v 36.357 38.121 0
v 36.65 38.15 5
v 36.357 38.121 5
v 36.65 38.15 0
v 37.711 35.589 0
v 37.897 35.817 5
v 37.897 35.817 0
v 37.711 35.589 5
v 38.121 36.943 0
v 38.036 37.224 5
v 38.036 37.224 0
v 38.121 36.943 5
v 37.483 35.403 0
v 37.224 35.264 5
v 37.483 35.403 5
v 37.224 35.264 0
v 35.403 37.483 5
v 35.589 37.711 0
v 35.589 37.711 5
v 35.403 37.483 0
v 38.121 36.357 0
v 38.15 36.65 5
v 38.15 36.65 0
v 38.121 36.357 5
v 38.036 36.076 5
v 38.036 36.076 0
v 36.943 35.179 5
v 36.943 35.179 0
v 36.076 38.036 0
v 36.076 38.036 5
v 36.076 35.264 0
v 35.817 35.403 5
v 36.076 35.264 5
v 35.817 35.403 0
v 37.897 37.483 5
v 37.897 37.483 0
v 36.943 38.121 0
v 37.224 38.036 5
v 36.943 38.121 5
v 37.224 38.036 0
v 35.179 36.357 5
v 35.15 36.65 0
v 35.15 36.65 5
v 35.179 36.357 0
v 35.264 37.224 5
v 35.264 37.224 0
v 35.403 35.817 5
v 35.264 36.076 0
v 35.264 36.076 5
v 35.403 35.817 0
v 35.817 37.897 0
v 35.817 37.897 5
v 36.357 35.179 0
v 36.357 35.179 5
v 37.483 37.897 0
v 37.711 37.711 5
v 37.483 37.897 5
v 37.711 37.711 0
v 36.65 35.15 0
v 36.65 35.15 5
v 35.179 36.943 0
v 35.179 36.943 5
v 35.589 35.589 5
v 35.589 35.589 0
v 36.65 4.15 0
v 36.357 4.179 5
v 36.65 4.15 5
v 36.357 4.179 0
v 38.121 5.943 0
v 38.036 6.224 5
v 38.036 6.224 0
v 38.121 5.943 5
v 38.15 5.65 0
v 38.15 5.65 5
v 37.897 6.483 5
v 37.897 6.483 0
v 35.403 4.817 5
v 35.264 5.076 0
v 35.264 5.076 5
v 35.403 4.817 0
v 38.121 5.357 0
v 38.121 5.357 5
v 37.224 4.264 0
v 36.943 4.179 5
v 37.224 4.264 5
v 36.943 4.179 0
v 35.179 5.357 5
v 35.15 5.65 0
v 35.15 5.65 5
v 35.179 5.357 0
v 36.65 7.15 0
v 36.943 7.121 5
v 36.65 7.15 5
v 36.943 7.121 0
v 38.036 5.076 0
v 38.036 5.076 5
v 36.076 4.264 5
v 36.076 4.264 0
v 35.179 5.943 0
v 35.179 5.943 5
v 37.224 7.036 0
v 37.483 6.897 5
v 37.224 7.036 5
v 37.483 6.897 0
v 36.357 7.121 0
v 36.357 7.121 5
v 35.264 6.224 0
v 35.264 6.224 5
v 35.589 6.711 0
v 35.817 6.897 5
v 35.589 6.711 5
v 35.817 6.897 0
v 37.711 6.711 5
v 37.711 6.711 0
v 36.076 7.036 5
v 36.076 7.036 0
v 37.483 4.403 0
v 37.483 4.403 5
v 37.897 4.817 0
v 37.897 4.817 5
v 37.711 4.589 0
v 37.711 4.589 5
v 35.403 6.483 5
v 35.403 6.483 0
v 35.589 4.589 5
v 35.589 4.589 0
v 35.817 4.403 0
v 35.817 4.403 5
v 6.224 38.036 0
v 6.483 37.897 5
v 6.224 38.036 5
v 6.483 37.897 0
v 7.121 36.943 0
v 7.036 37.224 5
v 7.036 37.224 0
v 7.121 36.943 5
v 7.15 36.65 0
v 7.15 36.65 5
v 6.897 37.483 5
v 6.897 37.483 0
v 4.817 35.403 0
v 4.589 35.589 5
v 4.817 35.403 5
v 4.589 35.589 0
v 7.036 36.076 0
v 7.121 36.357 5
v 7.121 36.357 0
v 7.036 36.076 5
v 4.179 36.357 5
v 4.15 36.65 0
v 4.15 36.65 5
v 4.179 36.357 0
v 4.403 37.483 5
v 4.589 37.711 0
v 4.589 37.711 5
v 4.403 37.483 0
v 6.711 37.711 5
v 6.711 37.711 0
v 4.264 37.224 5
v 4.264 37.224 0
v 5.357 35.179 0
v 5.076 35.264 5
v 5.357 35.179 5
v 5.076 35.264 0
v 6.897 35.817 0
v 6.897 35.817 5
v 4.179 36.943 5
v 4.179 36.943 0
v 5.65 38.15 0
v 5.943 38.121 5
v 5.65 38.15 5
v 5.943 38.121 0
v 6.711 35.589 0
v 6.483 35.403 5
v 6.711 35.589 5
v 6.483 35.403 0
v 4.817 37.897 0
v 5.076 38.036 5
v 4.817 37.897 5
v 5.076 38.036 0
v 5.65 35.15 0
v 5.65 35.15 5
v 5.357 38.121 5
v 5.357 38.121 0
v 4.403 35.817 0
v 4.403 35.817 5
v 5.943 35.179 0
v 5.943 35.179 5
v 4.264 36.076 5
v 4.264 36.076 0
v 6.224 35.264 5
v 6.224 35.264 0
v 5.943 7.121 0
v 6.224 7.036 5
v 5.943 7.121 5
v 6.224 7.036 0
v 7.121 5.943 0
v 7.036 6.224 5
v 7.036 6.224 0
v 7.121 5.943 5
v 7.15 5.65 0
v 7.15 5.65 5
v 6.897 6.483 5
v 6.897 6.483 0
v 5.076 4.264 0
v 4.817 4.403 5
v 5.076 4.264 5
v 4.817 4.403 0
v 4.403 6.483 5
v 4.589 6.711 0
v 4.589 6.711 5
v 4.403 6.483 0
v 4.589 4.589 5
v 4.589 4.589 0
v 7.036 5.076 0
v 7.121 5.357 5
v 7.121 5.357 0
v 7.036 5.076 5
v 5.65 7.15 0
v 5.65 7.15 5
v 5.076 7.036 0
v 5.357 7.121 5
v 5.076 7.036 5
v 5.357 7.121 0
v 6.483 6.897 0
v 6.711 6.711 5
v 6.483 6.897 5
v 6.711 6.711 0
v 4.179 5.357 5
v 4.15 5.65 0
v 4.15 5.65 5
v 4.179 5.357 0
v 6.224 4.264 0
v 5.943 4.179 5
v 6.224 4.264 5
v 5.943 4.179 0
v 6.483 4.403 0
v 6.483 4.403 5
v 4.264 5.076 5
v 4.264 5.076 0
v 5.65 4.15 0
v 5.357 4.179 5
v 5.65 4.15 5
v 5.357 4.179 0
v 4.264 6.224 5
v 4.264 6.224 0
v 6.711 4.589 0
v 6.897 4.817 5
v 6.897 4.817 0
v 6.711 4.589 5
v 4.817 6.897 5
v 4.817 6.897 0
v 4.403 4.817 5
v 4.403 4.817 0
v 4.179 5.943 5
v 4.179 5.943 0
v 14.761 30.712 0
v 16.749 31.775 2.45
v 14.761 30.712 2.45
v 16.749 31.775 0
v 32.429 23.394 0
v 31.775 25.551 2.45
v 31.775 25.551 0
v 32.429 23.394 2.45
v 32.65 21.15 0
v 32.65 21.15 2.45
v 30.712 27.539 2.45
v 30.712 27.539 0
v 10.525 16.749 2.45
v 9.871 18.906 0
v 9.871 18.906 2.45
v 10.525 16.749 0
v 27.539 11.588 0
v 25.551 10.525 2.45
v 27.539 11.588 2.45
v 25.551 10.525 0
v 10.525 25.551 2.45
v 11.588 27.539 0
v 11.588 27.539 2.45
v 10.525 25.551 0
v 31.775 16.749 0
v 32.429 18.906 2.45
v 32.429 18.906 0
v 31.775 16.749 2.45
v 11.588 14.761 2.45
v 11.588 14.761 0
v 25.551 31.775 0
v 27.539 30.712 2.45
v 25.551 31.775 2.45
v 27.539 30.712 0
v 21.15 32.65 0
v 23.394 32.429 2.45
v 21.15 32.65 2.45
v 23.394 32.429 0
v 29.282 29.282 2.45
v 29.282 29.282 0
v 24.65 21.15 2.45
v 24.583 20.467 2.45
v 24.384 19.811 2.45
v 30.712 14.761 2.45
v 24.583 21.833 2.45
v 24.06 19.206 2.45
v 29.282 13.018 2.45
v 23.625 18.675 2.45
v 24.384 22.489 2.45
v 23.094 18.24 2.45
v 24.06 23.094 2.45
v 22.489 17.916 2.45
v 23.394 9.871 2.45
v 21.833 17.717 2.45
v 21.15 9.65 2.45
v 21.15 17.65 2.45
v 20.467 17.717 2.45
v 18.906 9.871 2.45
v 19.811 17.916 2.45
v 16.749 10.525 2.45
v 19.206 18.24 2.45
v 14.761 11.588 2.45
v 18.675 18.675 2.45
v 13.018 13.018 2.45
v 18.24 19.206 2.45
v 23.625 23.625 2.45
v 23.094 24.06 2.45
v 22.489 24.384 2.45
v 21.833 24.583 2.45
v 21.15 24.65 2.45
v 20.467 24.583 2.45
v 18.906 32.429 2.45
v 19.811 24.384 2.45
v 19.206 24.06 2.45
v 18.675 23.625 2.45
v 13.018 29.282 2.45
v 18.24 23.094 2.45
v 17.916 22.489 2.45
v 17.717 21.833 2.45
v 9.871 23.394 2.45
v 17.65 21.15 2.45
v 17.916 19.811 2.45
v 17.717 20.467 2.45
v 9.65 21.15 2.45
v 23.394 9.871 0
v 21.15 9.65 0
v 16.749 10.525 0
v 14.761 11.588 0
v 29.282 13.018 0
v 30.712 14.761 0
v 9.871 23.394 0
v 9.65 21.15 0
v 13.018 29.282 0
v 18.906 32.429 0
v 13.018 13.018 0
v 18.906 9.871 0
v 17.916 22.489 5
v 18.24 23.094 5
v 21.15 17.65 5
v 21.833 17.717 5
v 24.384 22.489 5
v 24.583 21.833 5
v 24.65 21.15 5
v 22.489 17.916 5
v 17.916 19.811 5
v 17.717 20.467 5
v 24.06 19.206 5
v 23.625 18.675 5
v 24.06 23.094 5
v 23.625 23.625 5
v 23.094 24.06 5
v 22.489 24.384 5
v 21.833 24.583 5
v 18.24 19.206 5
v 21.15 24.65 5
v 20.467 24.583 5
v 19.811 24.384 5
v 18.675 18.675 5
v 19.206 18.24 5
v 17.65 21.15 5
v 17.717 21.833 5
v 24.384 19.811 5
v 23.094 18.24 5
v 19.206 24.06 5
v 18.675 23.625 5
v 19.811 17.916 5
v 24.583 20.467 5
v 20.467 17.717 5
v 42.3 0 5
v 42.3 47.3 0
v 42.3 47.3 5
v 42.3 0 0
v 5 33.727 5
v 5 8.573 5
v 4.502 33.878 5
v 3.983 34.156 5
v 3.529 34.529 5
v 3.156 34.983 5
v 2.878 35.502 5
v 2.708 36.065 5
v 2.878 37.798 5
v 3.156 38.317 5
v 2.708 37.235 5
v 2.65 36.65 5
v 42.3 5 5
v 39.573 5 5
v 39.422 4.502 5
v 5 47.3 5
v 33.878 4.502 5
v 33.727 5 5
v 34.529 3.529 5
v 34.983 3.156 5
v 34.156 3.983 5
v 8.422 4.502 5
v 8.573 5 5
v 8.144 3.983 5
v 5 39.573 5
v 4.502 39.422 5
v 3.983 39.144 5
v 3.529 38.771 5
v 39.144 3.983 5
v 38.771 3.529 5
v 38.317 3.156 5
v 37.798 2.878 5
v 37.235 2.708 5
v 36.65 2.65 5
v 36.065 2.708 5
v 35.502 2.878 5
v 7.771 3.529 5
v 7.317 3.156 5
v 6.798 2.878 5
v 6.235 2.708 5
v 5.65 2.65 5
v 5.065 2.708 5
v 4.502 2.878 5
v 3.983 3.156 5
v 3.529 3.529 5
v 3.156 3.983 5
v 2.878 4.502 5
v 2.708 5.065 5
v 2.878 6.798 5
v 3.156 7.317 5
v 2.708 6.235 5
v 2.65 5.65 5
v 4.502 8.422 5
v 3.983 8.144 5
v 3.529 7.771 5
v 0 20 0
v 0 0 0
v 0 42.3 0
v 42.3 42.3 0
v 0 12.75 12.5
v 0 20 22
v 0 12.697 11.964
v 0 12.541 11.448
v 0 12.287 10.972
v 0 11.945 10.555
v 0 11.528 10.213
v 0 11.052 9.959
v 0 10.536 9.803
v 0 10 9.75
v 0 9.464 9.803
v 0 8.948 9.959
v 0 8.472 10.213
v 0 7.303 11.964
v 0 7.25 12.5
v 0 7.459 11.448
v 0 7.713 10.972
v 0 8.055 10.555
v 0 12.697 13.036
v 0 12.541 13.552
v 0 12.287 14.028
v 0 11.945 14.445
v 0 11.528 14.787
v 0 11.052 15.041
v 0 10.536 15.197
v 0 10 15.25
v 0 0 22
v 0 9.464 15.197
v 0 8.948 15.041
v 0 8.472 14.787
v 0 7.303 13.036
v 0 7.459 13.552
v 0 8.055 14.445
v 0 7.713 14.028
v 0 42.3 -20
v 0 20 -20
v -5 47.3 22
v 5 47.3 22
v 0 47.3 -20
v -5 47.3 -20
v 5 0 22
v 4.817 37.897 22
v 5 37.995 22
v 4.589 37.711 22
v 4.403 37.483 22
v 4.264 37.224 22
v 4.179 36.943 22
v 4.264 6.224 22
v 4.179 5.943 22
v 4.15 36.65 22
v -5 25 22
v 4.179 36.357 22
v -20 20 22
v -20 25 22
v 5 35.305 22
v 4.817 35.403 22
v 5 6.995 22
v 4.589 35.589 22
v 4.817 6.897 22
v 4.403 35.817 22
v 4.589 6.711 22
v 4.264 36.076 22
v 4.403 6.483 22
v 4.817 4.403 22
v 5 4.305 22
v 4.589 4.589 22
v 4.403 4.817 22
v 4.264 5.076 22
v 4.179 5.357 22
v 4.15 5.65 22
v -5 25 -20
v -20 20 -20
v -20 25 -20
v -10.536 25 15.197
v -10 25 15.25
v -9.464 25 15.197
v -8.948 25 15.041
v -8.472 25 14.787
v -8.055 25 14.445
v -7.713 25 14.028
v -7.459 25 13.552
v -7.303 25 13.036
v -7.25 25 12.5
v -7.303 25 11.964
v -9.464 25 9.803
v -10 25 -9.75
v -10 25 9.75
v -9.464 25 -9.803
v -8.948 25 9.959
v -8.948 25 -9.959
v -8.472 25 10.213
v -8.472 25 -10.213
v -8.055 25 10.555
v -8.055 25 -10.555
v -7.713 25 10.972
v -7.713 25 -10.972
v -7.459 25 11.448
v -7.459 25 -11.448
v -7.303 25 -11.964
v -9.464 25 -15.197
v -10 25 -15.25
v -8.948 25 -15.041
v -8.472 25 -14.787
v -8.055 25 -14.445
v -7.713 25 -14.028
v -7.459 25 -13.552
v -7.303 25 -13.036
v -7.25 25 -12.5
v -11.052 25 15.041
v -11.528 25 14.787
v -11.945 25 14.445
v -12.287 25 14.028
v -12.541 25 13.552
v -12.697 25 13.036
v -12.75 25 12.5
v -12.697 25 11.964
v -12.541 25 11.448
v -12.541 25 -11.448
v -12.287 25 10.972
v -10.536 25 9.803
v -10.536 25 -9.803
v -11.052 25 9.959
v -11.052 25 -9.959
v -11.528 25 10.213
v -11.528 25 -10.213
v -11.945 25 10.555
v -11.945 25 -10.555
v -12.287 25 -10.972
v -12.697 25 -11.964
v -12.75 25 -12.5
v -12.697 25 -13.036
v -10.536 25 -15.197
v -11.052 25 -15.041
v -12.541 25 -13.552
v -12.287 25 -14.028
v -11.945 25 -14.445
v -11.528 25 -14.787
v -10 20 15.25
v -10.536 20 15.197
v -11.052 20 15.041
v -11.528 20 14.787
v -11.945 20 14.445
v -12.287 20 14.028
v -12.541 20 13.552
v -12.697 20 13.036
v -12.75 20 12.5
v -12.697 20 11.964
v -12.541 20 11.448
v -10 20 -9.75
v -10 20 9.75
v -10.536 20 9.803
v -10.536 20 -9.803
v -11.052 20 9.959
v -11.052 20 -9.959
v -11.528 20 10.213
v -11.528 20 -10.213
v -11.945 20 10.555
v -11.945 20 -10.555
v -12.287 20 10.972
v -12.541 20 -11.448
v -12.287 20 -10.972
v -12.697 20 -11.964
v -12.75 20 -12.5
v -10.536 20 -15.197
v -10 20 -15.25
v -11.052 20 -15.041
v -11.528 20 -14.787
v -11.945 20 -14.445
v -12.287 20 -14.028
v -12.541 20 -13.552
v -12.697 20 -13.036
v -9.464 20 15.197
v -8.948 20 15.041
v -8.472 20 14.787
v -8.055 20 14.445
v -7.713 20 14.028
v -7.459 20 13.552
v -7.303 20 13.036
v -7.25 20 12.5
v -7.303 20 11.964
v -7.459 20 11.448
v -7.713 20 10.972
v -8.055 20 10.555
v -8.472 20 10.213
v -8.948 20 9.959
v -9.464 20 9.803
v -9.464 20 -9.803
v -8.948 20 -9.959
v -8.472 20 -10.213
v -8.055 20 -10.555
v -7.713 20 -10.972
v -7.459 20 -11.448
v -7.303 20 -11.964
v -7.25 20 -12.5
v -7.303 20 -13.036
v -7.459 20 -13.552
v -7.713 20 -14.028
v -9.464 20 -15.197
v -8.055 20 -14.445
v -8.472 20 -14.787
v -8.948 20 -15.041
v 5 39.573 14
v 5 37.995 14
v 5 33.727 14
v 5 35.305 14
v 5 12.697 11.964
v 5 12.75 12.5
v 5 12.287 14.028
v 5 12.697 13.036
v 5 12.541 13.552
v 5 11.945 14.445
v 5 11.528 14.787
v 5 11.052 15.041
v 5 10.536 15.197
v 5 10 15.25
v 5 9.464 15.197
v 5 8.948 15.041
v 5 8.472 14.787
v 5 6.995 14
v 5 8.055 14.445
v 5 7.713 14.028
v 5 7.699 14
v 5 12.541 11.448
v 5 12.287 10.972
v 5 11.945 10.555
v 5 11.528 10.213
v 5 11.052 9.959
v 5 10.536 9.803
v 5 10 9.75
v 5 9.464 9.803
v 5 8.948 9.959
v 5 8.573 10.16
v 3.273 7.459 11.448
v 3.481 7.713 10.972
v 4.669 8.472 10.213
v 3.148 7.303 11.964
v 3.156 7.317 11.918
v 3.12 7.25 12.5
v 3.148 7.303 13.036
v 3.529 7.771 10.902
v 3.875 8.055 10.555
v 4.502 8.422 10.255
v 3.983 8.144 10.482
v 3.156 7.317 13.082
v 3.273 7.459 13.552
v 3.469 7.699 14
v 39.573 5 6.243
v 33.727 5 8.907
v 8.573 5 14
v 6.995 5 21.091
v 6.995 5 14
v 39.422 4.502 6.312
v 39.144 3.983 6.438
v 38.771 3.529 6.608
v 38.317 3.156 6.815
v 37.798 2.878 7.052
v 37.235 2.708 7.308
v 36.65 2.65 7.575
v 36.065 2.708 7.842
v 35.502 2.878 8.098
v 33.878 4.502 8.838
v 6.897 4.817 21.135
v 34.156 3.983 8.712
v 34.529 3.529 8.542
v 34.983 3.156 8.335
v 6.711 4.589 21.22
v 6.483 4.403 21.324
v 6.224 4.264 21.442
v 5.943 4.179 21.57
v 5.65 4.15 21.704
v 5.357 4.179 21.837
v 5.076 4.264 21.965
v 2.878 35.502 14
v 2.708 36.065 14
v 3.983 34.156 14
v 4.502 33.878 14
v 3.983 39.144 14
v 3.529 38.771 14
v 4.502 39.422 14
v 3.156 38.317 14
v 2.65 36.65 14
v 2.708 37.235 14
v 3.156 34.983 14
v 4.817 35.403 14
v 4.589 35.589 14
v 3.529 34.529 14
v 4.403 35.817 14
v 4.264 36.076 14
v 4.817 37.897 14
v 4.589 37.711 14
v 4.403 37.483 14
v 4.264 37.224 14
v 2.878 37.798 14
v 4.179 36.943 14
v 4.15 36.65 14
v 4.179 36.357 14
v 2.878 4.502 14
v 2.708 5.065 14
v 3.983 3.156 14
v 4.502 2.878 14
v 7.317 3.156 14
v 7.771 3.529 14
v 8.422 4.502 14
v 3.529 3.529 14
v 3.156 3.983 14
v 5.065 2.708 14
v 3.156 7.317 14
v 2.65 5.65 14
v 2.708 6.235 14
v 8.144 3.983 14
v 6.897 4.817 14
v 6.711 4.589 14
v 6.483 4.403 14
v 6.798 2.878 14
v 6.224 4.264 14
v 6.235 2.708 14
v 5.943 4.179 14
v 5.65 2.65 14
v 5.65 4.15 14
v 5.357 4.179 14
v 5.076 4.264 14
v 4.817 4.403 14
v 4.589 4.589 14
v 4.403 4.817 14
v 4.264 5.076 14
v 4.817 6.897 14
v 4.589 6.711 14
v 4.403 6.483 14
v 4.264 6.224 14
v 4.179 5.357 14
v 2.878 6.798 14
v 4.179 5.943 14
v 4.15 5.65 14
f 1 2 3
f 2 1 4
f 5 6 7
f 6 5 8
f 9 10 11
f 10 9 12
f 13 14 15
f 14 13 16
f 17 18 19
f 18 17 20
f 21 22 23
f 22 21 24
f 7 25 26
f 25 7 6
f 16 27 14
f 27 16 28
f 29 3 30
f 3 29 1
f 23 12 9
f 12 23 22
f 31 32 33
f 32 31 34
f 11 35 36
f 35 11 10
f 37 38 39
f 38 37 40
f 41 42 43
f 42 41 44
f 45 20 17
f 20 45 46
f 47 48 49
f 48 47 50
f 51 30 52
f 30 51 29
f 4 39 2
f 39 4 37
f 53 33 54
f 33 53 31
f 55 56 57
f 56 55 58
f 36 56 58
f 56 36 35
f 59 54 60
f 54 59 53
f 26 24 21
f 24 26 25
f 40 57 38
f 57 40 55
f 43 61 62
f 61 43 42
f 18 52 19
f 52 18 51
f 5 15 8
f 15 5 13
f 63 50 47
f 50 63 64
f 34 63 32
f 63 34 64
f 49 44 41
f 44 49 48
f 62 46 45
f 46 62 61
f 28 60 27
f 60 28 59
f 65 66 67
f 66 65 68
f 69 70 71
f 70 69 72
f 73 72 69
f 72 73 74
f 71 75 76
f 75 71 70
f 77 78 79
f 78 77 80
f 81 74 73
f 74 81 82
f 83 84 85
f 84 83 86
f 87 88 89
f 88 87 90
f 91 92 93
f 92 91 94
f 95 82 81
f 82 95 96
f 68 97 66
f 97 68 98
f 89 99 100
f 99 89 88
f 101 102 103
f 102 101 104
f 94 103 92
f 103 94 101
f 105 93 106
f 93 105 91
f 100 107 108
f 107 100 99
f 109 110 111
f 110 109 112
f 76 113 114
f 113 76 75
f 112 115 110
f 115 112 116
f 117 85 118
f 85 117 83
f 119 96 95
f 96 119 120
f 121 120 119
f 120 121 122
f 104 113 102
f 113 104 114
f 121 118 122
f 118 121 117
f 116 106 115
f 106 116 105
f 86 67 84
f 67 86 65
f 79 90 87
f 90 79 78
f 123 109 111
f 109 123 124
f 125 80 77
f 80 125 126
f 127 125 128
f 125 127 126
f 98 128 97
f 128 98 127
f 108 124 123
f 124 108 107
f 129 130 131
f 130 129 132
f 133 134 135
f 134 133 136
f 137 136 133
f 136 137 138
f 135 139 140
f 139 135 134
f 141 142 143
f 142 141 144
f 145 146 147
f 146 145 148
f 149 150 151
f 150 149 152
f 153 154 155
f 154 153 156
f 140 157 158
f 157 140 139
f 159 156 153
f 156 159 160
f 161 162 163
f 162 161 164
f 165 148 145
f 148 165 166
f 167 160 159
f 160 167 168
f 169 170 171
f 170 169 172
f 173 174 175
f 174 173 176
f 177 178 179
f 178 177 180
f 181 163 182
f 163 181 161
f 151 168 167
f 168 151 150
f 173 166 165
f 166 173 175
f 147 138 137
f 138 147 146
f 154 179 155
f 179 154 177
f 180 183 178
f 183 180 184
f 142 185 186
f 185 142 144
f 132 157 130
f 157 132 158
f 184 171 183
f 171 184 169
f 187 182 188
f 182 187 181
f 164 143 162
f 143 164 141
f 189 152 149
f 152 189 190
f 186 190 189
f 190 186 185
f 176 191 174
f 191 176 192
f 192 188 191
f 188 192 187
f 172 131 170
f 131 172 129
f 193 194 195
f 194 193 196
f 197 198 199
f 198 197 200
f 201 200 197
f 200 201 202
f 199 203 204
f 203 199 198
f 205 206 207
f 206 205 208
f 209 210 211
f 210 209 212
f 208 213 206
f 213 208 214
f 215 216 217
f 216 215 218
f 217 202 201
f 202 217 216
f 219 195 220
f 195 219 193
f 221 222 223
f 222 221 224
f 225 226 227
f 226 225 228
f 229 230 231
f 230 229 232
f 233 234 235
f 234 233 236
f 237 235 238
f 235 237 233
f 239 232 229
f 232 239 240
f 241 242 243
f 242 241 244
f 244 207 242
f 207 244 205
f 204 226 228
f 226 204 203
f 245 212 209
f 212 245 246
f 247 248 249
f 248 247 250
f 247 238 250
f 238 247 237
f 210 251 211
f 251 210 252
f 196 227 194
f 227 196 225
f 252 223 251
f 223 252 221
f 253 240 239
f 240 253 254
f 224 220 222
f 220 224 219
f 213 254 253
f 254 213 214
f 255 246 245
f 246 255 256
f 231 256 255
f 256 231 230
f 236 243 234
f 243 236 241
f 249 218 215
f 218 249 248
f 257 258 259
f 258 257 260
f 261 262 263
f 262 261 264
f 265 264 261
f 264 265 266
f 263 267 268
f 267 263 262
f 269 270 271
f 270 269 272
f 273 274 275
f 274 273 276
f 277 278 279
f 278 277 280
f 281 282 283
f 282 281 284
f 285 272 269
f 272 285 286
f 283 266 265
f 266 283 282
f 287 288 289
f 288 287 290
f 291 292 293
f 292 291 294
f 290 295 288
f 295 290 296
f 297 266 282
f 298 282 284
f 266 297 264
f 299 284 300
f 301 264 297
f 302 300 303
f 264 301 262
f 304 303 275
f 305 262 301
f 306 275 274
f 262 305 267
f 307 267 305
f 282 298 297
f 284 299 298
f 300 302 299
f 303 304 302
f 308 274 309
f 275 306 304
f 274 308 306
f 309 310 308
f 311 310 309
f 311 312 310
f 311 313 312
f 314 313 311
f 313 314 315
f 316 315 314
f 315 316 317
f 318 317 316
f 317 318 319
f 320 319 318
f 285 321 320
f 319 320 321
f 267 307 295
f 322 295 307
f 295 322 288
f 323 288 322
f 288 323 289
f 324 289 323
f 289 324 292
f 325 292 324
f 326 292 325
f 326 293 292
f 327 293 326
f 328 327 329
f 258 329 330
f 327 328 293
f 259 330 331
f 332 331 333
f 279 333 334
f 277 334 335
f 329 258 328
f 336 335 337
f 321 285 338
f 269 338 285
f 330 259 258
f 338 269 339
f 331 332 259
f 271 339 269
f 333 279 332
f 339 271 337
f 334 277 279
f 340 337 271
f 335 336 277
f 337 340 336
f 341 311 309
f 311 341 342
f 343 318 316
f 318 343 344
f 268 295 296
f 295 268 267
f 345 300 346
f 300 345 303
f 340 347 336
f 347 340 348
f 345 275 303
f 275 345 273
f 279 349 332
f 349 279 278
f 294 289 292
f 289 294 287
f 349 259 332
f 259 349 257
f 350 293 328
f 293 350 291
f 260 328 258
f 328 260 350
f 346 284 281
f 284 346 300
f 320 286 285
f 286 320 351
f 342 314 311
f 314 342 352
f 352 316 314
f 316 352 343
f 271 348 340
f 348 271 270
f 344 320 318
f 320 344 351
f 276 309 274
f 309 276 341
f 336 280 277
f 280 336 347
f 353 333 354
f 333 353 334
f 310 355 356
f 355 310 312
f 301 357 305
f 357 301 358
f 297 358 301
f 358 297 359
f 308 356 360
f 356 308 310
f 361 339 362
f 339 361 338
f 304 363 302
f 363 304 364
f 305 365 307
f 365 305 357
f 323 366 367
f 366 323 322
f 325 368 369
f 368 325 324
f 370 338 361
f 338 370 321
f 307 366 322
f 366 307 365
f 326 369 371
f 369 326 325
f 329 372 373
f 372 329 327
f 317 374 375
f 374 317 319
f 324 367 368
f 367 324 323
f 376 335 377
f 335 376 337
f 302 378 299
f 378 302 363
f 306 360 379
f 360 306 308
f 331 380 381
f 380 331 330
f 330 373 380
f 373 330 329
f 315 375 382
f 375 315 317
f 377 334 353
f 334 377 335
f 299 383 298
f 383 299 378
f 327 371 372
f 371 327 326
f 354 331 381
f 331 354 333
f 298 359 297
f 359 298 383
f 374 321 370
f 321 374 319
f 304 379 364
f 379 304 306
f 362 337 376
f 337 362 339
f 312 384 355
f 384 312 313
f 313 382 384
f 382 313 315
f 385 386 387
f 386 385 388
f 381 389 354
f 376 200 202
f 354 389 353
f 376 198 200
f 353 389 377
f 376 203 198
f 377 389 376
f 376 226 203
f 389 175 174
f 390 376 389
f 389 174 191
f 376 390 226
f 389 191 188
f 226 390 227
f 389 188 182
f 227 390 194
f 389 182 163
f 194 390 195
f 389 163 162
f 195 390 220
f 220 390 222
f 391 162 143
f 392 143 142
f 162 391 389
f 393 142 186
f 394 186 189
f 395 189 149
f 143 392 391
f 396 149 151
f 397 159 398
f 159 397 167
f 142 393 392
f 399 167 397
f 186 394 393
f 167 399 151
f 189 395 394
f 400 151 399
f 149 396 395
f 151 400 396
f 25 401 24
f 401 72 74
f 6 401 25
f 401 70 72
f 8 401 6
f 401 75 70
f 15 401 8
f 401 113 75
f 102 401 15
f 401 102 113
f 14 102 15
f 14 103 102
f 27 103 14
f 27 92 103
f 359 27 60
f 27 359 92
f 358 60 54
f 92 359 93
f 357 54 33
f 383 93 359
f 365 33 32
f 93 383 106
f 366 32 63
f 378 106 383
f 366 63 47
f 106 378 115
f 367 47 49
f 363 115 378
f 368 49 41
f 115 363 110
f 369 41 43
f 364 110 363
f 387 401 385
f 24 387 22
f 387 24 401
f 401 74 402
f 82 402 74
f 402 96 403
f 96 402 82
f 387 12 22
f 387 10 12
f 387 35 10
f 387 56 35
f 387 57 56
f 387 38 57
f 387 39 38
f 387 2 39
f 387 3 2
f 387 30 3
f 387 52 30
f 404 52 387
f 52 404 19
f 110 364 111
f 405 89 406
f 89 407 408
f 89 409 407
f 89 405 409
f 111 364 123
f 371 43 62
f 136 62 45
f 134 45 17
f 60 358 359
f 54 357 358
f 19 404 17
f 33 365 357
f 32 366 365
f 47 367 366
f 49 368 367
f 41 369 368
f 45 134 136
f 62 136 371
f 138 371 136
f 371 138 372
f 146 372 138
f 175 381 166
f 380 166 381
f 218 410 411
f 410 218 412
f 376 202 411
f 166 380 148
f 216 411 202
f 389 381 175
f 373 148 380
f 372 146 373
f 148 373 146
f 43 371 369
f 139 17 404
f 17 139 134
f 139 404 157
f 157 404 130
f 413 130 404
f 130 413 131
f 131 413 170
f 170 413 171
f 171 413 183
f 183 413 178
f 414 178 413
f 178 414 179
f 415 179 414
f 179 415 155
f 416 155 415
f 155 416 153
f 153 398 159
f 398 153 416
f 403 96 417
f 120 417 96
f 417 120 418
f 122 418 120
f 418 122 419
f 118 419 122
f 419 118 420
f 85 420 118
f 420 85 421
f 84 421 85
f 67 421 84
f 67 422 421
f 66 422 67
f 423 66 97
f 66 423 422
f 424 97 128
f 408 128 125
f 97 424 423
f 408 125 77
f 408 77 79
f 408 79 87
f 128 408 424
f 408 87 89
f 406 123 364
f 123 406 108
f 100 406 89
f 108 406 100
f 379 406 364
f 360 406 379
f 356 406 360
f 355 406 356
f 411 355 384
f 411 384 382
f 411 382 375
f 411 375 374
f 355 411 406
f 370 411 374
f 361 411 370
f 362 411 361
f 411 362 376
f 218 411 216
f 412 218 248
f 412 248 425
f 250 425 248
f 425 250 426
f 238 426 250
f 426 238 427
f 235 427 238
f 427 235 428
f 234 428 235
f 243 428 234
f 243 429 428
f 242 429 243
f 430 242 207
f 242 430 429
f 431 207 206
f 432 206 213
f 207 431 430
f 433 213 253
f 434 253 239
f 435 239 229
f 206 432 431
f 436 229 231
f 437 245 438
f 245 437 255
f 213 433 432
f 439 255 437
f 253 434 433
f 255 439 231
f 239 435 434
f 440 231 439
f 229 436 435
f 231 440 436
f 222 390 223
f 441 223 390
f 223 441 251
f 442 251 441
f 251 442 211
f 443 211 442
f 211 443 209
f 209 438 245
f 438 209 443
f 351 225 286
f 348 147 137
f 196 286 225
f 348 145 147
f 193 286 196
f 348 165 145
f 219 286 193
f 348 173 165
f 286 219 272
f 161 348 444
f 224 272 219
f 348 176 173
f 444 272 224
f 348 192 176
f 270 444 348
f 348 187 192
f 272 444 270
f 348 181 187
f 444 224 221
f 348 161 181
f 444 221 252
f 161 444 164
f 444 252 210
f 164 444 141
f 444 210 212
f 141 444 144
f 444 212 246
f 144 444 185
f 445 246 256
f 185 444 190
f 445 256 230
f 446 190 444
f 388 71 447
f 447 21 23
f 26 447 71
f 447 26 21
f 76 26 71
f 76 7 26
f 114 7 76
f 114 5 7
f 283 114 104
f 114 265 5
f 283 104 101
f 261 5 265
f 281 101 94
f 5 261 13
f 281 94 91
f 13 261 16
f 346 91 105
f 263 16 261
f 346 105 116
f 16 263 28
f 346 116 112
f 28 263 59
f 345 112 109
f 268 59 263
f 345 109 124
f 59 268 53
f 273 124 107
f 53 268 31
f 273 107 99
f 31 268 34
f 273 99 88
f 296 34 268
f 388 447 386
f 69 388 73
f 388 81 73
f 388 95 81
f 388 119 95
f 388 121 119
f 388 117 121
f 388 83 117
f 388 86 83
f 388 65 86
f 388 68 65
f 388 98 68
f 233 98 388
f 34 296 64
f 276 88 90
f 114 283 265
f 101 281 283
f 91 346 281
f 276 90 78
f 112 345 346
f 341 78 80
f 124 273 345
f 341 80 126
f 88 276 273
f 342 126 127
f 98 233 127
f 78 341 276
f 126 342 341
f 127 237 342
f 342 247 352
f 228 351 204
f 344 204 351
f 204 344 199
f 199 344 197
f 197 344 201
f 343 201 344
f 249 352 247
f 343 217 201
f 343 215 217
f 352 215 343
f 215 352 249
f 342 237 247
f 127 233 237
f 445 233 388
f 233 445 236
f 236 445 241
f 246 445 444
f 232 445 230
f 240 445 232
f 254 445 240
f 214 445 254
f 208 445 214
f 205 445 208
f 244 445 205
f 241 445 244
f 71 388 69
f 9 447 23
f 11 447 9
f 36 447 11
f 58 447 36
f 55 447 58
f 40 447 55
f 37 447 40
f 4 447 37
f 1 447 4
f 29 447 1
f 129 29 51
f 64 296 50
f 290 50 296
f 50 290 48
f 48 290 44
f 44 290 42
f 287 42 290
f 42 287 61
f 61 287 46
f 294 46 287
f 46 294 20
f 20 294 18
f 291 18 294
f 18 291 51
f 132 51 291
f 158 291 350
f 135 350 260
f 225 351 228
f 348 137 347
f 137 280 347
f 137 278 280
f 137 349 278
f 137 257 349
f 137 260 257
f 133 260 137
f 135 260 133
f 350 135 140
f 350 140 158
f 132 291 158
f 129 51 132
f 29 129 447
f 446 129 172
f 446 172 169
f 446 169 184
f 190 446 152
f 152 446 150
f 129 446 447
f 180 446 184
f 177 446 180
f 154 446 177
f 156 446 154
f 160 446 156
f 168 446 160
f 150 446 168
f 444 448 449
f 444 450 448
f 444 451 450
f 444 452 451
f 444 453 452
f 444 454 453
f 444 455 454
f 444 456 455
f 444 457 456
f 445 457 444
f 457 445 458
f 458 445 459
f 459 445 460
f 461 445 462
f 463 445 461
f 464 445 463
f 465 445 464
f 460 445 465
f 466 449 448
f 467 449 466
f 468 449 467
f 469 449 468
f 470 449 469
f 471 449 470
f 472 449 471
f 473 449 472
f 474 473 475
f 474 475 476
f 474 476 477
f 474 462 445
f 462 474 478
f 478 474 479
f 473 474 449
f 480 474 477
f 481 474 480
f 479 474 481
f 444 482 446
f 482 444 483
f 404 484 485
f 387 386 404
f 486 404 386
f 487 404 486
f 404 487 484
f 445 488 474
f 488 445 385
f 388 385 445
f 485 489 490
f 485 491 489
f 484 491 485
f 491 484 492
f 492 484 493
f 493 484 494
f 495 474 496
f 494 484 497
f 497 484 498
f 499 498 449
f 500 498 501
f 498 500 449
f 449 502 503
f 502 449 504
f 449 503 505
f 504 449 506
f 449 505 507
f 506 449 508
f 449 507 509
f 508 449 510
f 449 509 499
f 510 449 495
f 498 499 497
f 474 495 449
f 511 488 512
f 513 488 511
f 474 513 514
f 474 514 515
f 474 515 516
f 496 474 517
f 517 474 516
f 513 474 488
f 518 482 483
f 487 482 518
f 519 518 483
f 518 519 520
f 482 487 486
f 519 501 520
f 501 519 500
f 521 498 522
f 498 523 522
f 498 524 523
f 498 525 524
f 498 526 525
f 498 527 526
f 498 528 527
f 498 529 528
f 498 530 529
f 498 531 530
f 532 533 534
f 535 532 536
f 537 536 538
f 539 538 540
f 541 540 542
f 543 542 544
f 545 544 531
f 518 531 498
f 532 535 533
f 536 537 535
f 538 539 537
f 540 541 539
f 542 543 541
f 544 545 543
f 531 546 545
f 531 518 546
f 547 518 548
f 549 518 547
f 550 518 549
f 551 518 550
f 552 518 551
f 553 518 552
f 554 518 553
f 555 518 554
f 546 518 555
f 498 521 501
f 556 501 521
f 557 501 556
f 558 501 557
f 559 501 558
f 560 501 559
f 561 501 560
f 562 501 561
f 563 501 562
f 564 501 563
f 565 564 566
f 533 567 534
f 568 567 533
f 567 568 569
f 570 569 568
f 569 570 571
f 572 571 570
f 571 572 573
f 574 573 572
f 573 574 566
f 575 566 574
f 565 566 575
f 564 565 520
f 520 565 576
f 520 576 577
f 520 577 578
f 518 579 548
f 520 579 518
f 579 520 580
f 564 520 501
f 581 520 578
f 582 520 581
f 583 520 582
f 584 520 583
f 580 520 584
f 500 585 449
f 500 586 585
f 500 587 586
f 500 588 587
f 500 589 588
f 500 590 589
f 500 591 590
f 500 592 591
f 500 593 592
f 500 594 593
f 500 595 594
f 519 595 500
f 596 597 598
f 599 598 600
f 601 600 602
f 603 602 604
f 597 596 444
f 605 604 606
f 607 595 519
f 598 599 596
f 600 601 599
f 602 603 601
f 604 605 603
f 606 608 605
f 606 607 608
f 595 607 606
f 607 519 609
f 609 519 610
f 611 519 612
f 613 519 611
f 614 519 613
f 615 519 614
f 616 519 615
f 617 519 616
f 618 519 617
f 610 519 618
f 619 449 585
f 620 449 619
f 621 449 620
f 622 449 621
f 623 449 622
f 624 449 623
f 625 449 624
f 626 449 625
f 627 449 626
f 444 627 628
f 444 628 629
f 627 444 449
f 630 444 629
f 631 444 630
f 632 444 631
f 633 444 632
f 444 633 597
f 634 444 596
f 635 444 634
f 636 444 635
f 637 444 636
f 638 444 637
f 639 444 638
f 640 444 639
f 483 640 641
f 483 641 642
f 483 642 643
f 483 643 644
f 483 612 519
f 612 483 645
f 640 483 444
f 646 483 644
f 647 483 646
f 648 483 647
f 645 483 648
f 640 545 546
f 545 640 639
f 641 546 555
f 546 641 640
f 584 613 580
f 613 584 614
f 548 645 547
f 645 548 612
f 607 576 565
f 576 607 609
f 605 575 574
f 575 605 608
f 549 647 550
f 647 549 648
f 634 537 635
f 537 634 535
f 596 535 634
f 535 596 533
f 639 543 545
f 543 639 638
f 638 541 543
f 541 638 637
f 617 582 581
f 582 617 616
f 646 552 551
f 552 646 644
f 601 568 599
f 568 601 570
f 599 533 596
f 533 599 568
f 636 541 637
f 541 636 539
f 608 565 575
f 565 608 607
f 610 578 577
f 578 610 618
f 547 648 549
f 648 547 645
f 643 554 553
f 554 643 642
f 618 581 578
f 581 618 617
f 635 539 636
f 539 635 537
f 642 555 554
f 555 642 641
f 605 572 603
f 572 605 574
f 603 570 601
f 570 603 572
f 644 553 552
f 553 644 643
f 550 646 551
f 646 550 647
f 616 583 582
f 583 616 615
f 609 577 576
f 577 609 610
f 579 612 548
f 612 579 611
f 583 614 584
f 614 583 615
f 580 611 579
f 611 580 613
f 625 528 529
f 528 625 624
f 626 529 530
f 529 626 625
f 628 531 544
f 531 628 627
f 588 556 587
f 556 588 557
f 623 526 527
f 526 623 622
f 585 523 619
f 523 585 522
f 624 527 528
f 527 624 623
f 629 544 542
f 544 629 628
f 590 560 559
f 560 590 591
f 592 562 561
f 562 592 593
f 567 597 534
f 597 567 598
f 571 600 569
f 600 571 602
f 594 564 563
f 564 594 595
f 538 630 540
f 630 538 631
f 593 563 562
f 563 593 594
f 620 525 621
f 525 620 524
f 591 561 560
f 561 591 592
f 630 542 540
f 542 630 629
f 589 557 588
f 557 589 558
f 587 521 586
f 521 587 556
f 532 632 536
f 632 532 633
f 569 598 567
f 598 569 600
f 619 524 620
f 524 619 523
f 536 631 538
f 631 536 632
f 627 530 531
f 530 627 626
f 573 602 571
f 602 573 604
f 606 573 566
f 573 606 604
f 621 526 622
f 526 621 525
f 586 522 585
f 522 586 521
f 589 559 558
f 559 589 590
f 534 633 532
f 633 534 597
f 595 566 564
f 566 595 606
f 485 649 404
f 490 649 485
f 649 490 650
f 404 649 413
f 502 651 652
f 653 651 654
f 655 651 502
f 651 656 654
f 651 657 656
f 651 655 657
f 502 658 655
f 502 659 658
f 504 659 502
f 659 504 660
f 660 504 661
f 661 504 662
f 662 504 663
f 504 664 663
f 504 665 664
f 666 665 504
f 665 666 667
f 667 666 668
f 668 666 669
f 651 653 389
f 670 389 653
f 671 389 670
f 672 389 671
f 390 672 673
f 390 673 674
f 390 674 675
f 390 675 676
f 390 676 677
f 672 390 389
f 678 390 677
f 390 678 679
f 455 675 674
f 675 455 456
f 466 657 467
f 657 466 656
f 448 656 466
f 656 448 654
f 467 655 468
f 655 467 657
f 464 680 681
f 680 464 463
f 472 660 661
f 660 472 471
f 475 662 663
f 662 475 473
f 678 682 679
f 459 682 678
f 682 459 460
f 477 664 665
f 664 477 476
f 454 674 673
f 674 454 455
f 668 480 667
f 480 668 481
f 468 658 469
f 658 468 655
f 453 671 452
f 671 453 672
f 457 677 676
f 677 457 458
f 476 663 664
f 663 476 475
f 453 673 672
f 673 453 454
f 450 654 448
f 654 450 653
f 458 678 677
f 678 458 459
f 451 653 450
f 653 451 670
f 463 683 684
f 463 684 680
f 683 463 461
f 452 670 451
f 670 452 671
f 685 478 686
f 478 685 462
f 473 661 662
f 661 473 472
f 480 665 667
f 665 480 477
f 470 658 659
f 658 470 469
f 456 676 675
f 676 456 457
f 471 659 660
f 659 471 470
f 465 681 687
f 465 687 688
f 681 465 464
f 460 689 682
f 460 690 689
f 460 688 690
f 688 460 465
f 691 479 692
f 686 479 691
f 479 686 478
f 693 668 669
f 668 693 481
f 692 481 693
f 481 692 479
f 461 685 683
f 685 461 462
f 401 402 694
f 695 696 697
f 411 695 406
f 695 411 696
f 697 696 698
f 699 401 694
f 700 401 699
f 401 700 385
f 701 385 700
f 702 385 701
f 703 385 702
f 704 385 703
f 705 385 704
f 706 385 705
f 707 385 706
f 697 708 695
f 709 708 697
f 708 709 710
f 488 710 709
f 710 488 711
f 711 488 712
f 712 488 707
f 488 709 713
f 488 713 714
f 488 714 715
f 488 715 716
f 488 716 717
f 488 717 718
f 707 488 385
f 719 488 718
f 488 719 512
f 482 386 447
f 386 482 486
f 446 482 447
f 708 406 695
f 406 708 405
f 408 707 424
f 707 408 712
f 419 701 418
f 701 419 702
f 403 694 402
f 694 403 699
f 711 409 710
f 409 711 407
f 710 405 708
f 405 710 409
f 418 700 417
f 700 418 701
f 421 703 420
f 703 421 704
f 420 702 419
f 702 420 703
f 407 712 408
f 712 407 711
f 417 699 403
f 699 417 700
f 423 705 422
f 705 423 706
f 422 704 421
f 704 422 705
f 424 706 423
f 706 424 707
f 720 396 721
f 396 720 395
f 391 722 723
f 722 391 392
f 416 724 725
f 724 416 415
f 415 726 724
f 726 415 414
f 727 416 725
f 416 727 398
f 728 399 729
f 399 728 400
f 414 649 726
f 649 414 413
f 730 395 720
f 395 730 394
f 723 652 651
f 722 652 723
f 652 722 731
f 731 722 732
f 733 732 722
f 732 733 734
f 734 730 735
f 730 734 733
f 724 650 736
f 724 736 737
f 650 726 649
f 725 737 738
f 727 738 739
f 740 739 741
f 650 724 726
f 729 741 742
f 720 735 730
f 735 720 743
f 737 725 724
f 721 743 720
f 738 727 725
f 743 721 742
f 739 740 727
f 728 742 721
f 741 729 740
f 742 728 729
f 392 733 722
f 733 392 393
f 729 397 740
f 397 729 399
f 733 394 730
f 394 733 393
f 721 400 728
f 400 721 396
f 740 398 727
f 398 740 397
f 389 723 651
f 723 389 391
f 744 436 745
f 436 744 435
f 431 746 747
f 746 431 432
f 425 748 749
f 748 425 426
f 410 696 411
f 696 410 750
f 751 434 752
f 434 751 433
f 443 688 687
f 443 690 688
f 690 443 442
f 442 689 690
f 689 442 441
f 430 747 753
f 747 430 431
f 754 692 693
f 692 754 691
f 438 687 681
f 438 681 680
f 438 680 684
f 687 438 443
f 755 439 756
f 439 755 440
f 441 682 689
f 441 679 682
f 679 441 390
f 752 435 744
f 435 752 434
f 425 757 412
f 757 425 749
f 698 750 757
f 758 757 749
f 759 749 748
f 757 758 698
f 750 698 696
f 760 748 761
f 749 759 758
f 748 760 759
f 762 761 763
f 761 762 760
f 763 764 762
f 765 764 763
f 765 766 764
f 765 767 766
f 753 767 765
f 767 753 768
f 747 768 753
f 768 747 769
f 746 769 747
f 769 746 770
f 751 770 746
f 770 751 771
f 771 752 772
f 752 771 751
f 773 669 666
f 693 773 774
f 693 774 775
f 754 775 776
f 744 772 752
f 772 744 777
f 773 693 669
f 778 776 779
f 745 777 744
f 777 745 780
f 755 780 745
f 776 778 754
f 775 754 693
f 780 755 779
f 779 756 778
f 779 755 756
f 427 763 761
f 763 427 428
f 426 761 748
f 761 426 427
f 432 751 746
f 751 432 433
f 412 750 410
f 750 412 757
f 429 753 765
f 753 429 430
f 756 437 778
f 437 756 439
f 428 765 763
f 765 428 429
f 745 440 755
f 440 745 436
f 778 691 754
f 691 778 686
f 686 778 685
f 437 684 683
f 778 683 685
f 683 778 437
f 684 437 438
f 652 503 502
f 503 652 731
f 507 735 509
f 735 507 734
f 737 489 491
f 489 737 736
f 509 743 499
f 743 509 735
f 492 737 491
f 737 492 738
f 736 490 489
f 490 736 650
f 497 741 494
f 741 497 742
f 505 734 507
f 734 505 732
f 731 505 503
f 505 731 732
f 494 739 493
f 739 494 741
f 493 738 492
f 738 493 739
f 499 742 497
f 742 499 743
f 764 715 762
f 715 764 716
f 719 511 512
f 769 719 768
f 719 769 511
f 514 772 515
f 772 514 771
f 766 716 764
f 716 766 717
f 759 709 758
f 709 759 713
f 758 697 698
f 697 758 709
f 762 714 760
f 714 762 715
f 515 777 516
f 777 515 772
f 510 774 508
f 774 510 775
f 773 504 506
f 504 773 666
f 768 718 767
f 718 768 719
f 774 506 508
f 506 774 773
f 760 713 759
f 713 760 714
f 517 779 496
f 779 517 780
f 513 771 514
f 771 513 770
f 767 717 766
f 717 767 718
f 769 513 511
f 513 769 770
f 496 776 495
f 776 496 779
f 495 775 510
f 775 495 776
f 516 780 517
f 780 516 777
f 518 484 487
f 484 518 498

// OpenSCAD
$fn = 32;

module nema17(height, screw_mask_height) {
    difference() {
        translate([0,0,-height/2]) {
            hull() {
                cube([42.3, 31, height], center=true);
                cube([31, 42.3, height], center=true);
            }
        }
        translate([31/2,31/2,-4.5]) cylinder(h=9,d=3);
        translate([31/2,-31/2,-4.5]) cylinder(h=9,d=3);
        translate([-31/2,31/2,-4.5]) cylinder(h=9,d=3);
        translate([-31/2,-31/2,-4.5]) cylinder(h=9,d=3);
    }
    cylinder(h=2+0.5, d=22+1);
    cylinder(h=27, d=5+2);
    
    if(screw_mask_height>0) {
        translate([31/2,31/2,0]) cylinder(h=screw_mask_height,d=3);
        translate([31/2,-31/2,0]) cylinder(h=screw_mask_height,d=3);
        translate([-31/2,31/2,0]) cylinder(h=screw_mask_height,d=3);
        translate([-31/2,-31/2,0]) cylinder(h=screw_mask_height,d=3);
    }
}

w=42.3;
difference() {
    cube([w,w+5,5]);
    translate([w/2, w/2, -0.05]) nema17(height=60, screw_mask_height=10);
}

difference() {
  translate([-10, 20+5/2, 1]) cube([20,5,42],center=true);
  translate([-10,30,-12.5]) rotate([90,0,0]) cylinder(d=5.5, h=20);
  translate([-10,30,12.5]) rotate([90,0,0]) cylinder(d=5.5, h=20);
}

translate([-5/2, 3*w/4+2.5, 1]) cube([5,w/2+5,42],center=true);

difference() {
  union() {
    difference() {
      translate([5/2, w/2+2.5, 11]) cube([5,w+5,22],center=true);
      translate([-10,10,12.5]) rotate([90,0,90]) cylinder(d=5.5, h=20);
    }

    translate([5,5,5])
    rotate([90,0,0])
    linear_extrude(height = 5)
    polygon(points = [[0, 0], [0, 17], [w-5, 0]]);

    translate([0,w+5,0])
    rotate([90,0,0])
    linear_extrude(height = 5)
    polygon(points = [[0, 0], [0, -20], [w, 0]]);
  }
  translate([w/2+31/2,w/2+31/2,0]) cylinder(h=14,d=6);
  translate([w/2+31/2,w/2-31/2,0]) cylinder(h=14,d=6);
  translate([w/2-31/2,w/2+31/2,0]) cylinder(h=14,d=6);
  translate([w/2-31/2,w/2-31/2,0]) cylinder(h=14,d=6);
  
  translate([w/2+31/2,w/2+31/2,0]) cylinder(h=100,d=3);
  translate([w/2+31/2,w/2-31/2,0]) cylinder(h=100,d=3);
  translate([w/2-31/2,w/2+31/2,0]) cylinder(h=100,d=3);
  translate([w/2-31/2,w/2-31/2,0]) cylinder(h=100,d=3);
}
